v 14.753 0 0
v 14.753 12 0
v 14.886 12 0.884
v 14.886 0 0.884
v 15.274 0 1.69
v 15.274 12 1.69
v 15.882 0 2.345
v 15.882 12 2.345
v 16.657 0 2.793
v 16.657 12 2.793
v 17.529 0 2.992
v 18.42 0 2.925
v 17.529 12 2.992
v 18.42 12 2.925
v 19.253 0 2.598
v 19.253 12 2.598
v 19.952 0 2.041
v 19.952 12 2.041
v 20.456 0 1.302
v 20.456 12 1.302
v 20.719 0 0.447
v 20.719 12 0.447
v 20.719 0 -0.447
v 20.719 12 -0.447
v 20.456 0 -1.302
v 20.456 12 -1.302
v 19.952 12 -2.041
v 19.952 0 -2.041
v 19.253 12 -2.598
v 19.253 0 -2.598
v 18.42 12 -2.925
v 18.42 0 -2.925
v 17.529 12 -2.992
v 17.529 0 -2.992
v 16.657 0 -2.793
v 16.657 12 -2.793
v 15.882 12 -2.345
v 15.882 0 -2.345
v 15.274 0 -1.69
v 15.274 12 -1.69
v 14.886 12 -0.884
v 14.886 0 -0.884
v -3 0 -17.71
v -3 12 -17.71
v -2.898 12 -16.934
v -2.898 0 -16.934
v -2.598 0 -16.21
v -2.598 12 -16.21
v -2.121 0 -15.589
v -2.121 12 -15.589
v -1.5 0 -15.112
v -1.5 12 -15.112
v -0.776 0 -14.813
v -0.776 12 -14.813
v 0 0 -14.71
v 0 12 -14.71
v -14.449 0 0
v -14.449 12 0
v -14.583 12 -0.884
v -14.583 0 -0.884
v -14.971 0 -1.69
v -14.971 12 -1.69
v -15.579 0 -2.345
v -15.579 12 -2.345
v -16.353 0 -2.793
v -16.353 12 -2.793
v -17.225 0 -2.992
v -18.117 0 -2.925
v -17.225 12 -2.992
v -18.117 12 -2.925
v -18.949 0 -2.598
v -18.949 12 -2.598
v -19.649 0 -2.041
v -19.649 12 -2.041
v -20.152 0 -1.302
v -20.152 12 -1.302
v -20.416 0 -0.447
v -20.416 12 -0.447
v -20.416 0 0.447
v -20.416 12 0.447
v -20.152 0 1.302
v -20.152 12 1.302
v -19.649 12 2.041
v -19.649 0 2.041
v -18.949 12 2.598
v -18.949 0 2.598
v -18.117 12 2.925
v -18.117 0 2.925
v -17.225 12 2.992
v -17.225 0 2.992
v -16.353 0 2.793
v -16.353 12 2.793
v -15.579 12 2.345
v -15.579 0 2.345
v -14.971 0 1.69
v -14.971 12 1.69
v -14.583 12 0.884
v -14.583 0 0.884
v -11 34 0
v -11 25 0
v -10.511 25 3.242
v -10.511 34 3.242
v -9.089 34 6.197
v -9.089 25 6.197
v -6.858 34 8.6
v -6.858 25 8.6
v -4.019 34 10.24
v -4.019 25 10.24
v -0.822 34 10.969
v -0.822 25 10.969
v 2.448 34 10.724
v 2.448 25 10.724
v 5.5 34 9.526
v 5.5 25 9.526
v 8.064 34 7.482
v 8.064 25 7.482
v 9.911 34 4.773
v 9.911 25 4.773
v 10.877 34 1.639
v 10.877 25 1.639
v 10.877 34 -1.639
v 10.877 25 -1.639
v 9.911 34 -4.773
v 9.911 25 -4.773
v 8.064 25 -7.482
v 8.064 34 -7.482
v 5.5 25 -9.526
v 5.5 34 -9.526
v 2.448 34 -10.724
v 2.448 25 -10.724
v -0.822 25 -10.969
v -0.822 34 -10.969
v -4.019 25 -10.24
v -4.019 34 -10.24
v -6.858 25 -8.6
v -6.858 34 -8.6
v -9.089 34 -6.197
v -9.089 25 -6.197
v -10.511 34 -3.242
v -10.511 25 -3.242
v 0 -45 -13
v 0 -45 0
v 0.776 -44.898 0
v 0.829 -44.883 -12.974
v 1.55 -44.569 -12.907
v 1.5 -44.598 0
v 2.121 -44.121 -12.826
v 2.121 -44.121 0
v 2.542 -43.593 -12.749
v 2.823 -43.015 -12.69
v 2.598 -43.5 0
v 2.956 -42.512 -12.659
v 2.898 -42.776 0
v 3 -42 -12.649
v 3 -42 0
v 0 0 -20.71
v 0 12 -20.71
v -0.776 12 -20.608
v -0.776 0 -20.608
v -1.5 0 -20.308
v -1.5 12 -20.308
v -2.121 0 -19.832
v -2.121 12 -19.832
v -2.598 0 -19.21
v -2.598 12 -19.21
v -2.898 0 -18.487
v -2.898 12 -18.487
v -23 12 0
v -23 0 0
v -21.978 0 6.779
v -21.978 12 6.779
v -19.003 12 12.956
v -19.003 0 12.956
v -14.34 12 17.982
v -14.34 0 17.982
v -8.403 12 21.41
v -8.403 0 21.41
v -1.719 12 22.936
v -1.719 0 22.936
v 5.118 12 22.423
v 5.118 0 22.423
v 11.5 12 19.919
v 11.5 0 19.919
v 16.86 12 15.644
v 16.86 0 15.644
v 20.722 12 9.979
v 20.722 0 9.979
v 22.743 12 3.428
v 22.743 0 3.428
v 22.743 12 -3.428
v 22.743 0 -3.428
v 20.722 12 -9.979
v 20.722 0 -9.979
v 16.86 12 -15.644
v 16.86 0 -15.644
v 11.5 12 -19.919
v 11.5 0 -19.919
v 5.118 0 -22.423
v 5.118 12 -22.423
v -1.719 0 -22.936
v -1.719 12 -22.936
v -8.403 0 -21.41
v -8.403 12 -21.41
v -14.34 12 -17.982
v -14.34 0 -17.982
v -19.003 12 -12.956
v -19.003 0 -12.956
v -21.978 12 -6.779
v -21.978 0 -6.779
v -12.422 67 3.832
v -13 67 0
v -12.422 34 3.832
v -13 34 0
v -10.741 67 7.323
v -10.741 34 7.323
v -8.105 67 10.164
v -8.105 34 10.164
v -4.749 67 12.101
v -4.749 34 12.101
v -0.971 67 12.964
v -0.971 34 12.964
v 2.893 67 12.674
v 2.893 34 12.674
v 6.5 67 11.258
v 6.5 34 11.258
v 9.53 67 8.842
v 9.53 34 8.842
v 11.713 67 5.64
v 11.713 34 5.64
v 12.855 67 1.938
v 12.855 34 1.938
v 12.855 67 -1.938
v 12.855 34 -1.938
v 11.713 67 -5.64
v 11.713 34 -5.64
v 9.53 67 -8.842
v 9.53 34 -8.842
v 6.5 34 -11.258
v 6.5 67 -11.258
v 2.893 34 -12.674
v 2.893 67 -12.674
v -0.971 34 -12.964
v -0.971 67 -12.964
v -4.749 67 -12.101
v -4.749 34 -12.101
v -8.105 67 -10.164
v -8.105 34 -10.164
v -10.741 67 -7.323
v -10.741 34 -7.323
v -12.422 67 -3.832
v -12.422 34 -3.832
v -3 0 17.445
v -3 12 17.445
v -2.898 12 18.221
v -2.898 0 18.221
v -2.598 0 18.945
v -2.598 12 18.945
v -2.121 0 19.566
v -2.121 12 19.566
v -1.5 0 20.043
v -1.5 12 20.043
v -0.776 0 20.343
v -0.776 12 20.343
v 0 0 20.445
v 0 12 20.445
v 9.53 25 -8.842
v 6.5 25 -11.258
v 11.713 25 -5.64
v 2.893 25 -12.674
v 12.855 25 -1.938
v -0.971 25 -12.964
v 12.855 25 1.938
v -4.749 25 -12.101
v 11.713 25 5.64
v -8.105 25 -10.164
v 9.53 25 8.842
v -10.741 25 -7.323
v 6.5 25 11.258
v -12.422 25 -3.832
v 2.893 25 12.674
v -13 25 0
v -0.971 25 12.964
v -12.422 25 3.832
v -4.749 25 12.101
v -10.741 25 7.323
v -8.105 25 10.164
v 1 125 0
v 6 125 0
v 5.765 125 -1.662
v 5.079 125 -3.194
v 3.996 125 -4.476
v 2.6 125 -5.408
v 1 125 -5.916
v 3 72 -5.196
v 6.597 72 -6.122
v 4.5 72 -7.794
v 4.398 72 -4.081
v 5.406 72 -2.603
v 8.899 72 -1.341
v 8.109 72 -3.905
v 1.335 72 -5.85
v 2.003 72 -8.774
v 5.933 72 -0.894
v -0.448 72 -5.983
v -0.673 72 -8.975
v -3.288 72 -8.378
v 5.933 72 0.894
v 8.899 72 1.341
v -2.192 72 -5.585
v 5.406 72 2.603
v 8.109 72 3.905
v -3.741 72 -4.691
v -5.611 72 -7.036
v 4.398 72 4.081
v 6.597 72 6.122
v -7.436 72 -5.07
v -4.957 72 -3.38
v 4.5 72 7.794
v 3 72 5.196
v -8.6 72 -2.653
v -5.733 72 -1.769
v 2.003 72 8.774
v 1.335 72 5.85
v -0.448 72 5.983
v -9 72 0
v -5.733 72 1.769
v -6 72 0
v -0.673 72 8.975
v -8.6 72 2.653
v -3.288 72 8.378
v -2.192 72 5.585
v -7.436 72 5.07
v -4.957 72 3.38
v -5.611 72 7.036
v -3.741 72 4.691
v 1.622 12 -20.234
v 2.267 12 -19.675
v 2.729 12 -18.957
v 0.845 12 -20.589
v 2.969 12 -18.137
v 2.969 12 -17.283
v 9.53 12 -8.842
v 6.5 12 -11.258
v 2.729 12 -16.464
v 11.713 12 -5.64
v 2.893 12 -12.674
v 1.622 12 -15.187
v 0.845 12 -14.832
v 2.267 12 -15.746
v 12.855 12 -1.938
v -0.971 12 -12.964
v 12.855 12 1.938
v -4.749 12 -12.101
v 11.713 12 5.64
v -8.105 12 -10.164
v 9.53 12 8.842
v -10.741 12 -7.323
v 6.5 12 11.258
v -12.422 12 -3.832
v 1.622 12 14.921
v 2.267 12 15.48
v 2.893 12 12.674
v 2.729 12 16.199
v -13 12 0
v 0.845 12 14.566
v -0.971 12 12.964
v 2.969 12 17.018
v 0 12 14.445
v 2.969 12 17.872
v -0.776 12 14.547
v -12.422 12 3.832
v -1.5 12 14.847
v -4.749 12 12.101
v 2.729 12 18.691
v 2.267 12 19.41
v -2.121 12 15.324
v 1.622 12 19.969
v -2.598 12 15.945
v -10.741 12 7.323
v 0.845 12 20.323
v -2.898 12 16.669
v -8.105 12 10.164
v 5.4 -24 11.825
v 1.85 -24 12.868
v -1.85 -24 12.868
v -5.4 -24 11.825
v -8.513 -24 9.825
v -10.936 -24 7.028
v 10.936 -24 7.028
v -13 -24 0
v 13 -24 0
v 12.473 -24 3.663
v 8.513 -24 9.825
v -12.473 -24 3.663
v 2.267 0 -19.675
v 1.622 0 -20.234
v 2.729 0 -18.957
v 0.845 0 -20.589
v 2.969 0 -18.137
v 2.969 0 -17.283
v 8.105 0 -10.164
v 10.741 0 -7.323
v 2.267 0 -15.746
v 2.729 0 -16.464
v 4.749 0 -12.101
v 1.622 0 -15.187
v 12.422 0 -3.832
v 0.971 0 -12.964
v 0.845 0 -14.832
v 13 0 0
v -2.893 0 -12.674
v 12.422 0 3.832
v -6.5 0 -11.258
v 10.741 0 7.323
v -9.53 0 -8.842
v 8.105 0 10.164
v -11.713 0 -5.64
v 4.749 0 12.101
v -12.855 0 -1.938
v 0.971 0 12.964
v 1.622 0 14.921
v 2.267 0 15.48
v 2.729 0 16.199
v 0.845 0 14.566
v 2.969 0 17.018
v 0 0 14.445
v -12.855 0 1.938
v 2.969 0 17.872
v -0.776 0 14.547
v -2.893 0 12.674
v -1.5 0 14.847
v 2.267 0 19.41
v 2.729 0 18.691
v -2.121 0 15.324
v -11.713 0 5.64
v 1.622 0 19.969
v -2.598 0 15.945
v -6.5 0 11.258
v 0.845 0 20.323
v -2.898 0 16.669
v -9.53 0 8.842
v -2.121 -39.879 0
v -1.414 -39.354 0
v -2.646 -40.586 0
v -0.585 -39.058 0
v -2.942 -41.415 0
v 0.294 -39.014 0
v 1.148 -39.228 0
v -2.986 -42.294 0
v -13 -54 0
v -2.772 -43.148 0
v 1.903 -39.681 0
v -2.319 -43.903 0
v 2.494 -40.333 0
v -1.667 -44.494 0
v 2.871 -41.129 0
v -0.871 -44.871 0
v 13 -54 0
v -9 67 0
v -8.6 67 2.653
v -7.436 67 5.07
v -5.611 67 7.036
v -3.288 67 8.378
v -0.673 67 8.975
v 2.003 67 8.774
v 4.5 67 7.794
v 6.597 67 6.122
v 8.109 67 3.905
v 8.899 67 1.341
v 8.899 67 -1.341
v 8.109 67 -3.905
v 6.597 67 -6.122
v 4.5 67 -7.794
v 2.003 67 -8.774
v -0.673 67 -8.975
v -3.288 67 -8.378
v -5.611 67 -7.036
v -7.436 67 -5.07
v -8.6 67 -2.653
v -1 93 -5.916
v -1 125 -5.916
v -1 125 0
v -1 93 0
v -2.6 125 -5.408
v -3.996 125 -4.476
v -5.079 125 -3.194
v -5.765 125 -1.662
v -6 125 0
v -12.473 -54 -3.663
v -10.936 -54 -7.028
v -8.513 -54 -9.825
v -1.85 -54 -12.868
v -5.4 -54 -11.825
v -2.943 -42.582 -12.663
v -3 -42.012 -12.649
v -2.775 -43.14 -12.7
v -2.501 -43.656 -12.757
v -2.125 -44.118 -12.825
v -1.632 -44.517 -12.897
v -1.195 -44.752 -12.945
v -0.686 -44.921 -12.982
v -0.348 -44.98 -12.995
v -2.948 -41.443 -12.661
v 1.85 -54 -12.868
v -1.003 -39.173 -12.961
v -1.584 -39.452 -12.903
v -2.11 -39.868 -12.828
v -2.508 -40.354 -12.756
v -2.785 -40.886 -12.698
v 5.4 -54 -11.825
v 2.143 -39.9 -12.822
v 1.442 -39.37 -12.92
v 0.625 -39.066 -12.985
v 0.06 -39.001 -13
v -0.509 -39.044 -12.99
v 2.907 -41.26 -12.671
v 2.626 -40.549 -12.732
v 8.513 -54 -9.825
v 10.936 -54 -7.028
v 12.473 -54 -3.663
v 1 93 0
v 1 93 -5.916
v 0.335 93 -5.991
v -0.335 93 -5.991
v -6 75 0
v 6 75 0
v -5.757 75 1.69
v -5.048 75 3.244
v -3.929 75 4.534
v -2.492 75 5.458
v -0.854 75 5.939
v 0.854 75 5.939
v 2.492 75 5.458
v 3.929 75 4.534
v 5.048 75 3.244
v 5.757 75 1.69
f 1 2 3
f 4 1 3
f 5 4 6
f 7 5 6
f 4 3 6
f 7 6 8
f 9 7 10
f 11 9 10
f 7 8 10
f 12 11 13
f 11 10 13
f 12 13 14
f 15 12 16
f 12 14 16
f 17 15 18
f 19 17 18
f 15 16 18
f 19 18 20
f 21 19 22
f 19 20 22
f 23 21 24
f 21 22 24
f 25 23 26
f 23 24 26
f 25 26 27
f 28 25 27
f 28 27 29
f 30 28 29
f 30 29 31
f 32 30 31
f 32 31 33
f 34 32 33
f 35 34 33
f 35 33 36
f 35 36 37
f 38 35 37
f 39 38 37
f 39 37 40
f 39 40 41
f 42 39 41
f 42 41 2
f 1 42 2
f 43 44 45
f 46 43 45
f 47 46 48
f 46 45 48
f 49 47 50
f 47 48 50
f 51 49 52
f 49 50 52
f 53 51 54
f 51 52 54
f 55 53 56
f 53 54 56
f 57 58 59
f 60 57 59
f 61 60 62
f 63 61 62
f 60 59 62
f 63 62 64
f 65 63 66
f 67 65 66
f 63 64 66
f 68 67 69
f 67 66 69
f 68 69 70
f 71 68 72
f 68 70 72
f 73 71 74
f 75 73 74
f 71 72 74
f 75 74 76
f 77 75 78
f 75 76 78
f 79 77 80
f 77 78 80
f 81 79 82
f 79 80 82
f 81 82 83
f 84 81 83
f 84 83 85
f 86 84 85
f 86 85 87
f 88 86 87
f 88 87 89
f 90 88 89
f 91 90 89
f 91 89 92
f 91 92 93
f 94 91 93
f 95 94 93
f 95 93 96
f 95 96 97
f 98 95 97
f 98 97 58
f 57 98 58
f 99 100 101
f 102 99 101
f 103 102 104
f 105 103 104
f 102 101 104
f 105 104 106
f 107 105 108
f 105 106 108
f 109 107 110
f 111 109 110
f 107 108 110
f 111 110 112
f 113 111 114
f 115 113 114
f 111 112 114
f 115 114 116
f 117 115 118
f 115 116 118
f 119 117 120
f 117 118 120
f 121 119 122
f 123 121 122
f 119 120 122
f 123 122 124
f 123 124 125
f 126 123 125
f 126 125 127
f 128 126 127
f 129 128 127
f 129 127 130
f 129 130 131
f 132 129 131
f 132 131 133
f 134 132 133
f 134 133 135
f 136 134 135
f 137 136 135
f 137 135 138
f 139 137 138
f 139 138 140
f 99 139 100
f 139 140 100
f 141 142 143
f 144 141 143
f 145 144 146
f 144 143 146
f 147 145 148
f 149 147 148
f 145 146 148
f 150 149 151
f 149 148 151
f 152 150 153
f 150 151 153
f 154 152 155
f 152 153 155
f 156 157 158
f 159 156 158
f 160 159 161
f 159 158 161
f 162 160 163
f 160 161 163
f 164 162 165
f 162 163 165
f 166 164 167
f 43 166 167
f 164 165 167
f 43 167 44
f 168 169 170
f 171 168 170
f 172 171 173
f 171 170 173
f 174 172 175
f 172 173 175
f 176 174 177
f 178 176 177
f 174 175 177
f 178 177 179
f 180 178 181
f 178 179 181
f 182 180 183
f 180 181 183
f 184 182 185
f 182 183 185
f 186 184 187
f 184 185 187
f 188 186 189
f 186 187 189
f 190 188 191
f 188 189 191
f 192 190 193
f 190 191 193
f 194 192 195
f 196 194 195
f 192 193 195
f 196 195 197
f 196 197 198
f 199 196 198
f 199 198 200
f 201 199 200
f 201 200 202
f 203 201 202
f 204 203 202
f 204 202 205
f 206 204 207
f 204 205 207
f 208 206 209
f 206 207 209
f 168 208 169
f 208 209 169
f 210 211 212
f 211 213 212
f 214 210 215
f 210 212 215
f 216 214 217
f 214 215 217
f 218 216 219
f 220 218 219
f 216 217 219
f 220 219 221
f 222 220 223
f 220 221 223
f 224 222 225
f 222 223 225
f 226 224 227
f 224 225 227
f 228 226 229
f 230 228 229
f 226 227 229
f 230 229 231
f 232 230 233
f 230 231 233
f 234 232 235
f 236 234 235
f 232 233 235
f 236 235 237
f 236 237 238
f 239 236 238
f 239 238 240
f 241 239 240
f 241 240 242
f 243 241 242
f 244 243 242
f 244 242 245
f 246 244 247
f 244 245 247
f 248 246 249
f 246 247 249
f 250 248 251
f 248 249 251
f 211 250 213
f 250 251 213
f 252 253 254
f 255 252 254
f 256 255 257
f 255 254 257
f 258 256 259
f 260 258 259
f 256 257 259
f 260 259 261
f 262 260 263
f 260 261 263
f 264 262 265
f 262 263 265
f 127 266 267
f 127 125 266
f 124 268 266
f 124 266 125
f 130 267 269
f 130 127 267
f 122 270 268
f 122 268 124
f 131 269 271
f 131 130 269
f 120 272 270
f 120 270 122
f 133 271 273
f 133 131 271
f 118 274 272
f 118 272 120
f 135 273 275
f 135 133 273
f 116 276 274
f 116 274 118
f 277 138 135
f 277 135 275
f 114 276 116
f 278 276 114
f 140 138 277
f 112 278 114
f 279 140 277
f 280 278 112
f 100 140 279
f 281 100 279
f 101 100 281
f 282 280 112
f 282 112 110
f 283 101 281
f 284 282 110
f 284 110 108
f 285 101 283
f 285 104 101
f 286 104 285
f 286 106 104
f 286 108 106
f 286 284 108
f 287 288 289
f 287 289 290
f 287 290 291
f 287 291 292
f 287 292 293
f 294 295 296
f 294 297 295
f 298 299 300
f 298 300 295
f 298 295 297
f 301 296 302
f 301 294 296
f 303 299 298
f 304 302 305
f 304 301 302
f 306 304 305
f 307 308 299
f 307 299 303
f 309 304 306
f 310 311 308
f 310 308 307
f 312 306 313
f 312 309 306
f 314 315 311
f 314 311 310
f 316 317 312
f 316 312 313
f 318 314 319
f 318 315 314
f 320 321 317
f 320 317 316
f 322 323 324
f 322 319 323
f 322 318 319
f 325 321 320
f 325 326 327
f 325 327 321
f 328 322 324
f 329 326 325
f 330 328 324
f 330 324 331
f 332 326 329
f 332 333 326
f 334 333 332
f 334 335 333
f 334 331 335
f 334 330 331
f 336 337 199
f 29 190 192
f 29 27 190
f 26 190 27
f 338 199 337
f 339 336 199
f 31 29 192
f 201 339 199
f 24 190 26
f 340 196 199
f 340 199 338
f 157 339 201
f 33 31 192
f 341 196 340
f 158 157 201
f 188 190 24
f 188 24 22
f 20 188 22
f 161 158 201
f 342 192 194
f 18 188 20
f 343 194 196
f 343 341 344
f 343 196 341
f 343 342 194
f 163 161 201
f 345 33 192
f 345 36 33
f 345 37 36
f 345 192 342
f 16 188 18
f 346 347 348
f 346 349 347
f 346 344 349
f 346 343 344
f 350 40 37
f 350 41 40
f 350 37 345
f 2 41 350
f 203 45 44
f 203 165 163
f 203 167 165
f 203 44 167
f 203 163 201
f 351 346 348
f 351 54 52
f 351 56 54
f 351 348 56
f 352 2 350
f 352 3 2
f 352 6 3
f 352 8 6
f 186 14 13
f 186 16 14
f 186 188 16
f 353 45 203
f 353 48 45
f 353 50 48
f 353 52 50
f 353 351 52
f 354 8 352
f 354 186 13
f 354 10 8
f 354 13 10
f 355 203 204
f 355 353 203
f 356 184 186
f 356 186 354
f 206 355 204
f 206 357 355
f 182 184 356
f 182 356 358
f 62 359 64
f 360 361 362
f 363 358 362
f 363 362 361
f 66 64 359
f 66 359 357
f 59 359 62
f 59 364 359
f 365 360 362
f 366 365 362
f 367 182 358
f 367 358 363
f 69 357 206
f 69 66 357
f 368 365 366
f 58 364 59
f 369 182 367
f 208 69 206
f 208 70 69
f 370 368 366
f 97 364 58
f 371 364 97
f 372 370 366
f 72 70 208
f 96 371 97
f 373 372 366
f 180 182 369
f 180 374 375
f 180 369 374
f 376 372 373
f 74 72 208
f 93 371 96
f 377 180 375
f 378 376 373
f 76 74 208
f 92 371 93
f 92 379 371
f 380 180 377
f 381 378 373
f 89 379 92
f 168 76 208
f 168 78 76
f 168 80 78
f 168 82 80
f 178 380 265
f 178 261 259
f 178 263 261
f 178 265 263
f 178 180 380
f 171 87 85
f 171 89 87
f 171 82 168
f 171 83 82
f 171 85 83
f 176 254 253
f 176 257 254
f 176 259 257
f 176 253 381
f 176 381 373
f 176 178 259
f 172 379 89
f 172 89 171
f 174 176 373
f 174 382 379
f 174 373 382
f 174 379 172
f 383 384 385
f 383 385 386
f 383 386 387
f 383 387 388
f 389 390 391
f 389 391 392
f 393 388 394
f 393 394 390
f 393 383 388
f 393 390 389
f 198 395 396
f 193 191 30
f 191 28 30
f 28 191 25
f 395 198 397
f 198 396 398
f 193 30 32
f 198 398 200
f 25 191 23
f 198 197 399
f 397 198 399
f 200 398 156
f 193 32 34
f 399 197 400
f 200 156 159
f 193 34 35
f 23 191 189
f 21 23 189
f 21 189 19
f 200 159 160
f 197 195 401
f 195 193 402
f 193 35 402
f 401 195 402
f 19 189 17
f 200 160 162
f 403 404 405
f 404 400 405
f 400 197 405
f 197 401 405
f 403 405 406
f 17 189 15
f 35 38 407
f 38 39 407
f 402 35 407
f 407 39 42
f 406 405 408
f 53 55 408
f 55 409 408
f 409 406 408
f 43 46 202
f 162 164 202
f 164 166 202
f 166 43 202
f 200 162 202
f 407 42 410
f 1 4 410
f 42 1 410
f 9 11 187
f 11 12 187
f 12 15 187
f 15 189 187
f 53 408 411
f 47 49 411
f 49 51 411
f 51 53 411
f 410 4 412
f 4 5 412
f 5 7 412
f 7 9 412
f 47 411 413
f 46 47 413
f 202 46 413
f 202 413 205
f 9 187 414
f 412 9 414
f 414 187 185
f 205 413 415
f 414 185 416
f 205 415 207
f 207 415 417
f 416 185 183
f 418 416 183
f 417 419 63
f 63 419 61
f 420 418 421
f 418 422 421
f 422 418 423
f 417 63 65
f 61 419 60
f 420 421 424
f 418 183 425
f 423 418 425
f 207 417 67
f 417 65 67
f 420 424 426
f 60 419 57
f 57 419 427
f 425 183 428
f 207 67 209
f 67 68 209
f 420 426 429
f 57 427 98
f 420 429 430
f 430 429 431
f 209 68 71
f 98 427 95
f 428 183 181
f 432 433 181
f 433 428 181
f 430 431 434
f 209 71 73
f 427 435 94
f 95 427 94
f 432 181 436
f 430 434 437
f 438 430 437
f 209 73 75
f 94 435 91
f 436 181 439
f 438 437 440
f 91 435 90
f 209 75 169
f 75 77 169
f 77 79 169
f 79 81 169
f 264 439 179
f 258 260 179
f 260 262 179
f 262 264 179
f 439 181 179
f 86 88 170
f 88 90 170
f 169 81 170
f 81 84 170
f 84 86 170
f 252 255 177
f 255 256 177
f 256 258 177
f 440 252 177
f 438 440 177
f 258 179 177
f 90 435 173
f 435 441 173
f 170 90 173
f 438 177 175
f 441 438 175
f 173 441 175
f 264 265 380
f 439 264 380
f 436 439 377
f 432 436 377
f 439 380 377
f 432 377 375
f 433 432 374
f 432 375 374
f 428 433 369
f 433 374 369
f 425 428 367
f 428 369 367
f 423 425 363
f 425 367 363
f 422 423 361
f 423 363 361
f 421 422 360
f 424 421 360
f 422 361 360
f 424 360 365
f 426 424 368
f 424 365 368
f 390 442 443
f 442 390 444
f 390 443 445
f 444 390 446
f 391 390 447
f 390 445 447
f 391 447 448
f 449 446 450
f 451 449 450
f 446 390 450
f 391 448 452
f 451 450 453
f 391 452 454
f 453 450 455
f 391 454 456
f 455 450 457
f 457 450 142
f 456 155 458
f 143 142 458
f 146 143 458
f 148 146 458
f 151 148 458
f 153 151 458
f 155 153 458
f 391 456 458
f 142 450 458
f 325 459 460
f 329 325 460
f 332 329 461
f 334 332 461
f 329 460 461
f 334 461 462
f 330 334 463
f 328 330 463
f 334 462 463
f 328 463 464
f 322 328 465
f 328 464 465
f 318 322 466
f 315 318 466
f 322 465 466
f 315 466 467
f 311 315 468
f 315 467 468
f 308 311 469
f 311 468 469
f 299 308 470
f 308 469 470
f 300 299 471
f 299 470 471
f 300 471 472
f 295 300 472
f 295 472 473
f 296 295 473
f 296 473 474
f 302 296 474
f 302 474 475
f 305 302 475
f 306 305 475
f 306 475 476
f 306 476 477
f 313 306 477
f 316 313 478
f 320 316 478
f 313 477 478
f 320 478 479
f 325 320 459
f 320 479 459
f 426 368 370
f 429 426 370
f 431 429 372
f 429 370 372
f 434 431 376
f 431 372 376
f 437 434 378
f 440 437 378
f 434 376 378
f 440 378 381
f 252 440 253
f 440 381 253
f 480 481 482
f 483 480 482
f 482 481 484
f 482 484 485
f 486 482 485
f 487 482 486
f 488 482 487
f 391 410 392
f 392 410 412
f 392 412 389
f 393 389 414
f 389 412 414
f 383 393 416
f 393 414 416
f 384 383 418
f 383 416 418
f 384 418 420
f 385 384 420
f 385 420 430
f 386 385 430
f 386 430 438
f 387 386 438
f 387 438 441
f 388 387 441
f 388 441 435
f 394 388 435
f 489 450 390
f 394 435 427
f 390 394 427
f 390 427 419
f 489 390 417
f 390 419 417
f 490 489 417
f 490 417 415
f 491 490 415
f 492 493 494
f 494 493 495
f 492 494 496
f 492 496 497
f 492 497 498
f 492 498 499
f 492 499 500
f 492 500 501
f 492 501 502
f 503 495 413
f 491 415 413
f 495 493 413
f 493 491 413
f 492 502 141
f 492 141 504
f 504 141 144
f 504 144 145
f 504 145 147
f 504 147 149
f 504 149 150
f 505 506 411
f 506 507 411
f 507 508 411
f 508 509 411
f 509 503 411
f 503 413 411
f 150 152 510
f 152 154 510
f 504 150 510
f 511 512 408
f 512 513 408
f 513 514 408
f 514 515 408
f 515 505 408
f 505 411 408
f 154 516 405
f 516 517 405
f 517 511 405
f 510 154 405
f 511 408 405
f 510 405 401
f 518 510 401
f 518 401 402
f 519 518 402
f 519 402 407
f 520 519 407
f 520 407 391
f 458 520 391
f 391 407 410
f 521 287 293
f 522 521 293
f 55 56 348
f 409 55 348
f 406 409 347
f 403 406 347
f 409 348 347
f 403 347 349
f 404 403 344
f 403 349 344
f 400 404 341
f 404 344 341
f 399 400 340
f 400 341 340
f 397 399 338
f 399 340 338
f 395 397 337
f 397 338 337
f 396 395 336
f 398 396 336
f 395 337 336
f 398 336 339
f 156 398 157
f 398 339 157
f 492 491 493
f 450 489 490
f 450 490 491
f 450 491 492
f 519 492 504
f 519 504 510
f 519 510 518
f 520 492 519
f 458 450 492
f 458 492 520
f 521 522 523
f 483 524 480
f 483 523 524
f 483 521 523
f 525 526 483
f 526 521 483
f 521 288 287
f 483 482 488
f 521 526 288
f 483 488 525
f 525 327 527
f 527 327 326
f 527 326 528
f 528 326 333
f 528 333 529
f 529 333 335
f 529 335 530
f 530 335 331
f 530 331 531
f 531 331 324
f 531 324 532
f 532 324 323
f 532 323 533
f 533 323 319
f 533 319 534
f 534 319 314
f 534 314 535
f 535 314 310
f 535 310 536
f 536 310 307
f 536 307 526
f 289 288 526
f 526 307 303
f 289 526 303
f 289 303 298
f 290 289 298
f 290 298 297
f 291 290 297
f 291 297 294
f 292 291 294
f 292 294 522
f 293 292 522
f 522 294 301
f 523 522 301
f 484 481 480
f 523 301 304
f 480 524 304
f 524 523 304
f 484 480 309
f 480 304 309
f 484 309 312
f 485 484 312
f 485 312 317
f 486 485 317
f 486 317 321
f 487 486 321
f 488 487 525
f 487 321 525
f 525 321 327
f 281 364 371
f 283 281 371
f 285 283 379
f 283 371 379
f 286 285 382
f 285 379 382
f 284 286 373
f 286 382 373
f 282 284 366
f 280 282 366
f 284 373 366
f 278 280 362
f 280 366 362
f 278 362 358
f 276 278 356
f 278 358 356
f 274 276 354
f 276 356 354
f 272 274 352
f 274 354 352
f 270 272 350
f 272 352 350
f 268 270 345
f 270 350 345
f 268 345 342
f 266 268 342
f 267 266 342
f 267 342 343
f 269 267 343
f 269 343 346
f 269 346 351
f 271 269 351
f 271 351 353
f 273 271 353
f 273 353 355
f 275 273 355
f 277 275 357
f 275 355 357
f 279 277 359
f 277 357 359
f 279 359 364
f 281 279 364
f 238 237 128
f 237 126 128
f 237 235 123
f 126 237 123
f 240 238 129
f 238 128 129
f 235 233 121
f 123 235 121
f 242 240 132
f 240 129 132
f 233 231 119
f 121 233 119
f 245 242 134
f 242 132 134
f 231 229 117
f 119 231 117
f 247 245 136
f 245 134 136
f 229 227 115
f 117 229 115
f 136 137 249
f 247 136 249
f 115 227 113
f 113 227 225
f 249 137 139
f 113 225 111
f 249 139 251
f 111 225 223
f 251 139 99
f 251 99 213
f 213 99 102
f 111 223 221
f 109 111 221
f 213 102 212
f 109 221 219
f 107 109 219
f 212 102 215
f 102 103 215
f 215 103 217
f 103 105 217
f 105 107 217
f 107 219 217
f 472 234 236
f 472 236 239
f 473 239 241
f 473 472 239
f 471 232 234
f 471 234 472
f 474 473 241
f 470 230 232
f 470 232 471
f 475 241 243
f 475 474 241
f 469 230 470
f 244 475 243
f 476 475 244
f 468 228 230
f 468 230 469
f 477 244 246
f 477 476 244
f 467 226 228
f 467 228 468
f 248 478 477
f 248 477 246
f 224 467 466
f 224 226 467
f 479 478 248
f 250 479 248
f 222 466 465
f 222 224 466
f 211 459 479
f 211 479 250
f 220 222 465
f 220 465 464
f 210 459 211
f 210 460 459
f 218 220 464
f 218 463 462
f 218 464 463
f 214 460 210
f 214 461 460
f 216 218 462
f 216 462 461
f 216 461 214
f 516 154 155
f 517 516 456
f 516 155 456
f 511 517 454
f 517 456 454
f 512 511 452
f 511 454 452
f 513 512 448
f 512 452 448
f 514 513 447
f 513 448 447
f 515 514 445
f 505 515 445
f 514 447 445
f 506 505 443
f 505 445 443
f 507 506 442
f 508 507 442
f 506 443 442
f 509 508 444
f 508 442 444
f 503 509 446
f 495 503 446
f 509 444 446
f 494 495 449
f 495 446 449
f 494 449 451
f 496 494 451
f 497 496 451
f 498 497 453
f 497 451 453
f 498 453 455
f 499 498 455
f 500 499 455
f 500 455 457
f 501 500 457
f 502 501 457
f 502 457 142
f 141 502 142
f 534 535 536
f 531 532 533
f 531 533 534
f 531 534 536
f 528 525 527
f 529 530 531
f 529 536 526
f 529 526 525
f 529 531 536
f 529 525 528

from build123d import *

# Parameters (mm, degrees)
F0_R      = 13
F1_DEPTH  = 54
F3_DEPTH  = 30
F4_R      = 23
F5_DEPTH  = 12
F7_DEPTH  = 25
F8_R      = 13
F9_DEPTH  = 13
F10_R     = 11
F11_DEPTH = 9
F12_R     = 13
F13_DEPTH = 8
F14_R     = 13
F15_DEPTH = 25
F17_DEPTH = 14
F18_R     = 9
F19_DEPTH = 5
F20_R     = 6
F21_DEPTH = 53
F23_DEPTH = 50
F25_DEPTH = 32


with BuildPart() as f1:
    # F0 (on Front) → F1 (new body)
    with BuildSketch(Plane.XZ):
        Circle(F0_R)
    extrude(amount=F1_DEPTH)

    # F2 (on face) → F3 (cut)
    with BuildSketch(Plane.XZ.offset(54)):
        with BuildLine():
            Line((-13, 0), (0, 0))
            Line((0, 0), (13, 0))
            ThreePointArc((13, 0), (0, 13), (-13, 0))
        make_face()
    extrude(amount=-F3_DEPTH, mode=Mode.SUBTRACT)

    # F4 (on face) → F5 (join)
    with BuildSketch(Plane(origin=(0, 0, 0), x_dir=(-1, 0, 0), z_dir=(0, 1, 0))):
        Circle(F4_R)
    extrude(amount=F5_DEPTH)

    # F6 (on face) → F7 (cut)
    with BuildSketch(Plane(origin=(0, 12, 0), x_dir=(-1, 0, 0), z_dir=(0, 1, 0))):
        with BuildLine():
            ThreePointArc((0, 20.4449764911), (-3, 17.4449764911), (0, 14.4449764911))
            Line((0, 14.4449764911), (0, 20.4449764911))
        make_face()
        with BuildLine():
            Line((0, 20.4449764911), (0, 14.4449764911))
            ThreePointArc((0, 14.4449764911), (2.1213203436, 15.3236561476), (3, 17.4449764911))
            ThreePointArc((3, 17.4449764911), (2.1213203436, 19.5662968347), (0, 20.4449764911))
        make_face()
        with BuildLine():
            ThreePointArc((3, -17.7103122696), (2.1213203436, -15.5889919261), (0, -14.7103122696))
            Line((0, -14.7103122696), (0, -20.7103122696))
            ThreePointArc((0, -20.7103122696), (2.1213203436, -19.8316326132), (3, -17.7103122696))
        make_face()
        with BuildLine():
            Line((0, -20.7103122696), (0, -14.7103122696))
            ThreePointArc((0, -14.7103122696), (-3, -17.7103122696), (0, -20.7103122696))
        make_face()
        with BuildLine():
            ThreePointArc((-20.7528914064, 0), (-17.7528914064, -3), (-14.7528914064, 0))
            Line((-14.7528914064, 0), (-20.7528914064, 0))
        make_face()
        with BuildLine():
            Line((-20.7528914064, 0), (-14.7528914064, 0))
            ThreePointArc((-14.7528914064, 0), (-17.7528914064, 3), (-20.7528914064, 0))
        make_face()
        with BuildLine():
            ThreePointArc((20.4494218081, 0), (17.4494218081, 3), (14.4494218081, 0))
            Line((14.4494218081, 0), (20.4494218081, 0))
        make_face()
        with BuildLine():
            Line((20.4494218081, 0), (14.4494218081, 0))
            ThreePointArc((14.4494218081, 0), (17.4494218081, -3), (20.4494218081, 0))
        make_face()
    extrude(amount=-F7_DEPTH, mode=Mode.SUBTRACT)

    # F8 (on face) → F9 (join)
    with BuildSketch(Plane(origin=(0, 12, 0), x_dir=(-1, 0, 0), z_dir=(0, 1, 0))):
        Circle(F8_R)
    extrude(amount=F9_DEPTH)

    # F10 (on face) → F11 (join)
    with BuildSketch(Plane(origin=(0, 25, 0), x_dir=(-1, 0, 0), z_dir=(0, 1, 0))):
        Circle(F10_R)
    extrude(amount=F11_DEPTH)

    # F12 (on face) → F13 (join)
    with BuildSketch(Plane(origin=(0, 34, 0), x_dir=(-1, 0, 0), z_dir=(0, 1, 0))):
        Circle(F12_R)
    extrude(amount=F13_DEPTH)

    # F14 (on face) → F15 (join)
    with BuildSketch(Plane(origin=(0, 42, 0), x_dir=(-1, 0, 0), z_dir=(0, 1, 0))):
        Circle(F14_R)
    extrude(amount=F15_DEPTH)

    # F16 (on face) → F17 (cut)
    with BuildSketch(Plane.XY):
        with BuildLine():
            ThreePointArc((0, -45), (2.1213203436, -44.1213203436), (3, -42))
            ThreePointArc((3, -42), (-2.1213203436, -39.8786796564), (0, -45))
        make_face()
    extrude(amount=-F17_DEPTH, mode=Mode.SUBTRACT)

    # F18 (on face) → F19 (join)
    with BuildSketch(Plane(origin=(0, 67, 0), x_dir=(-1, 0, 0), z_dir=(0, 1, 0))):
        Circle(F18_R)
    extrude(amount=F19_DEPTH)

    # F20 (on face) → F21 (join)
    with BuildSketch(Plane(origin=(0, 72, 0), x_dir=(-1, 0, 0), z_dir=(0, 1, 0))):
        Circle(F20_R)
    extrude(amount=F21_DEPTH)

    # F22 (on face) → F23 (cut)
    with BuildSketch(Plane(origin=(0, 125, 0), x_dir=(-1, 0, 0), z_dir=(0, 1, 0))):
        with BuildLine():
            Line((0, 0), (6, 0))
            ThreePointArc((6, 0), (0, 6), (-6, 0))
            Line((-6, 0), (0, 0))
        make_face()
    extrude(amount=-F23_DEPTH, mode=Mode.SUBTRACT)

    # F24 (on face) → F25 (cut)
    with BuildSketch(Plane(origin=(0, 125, 0), x_dir=(-1, 0, 0), z_dir=(0, 1, 0))):
        Polygon((1, 0), (0, 0), (-1, 0), (-1, -7.1843406186), (1, -7.1843406186), align=None)
    extrude(amount=-F25_DEPTH, mode=Mode.SUBTRACT)


solid = f1.part
